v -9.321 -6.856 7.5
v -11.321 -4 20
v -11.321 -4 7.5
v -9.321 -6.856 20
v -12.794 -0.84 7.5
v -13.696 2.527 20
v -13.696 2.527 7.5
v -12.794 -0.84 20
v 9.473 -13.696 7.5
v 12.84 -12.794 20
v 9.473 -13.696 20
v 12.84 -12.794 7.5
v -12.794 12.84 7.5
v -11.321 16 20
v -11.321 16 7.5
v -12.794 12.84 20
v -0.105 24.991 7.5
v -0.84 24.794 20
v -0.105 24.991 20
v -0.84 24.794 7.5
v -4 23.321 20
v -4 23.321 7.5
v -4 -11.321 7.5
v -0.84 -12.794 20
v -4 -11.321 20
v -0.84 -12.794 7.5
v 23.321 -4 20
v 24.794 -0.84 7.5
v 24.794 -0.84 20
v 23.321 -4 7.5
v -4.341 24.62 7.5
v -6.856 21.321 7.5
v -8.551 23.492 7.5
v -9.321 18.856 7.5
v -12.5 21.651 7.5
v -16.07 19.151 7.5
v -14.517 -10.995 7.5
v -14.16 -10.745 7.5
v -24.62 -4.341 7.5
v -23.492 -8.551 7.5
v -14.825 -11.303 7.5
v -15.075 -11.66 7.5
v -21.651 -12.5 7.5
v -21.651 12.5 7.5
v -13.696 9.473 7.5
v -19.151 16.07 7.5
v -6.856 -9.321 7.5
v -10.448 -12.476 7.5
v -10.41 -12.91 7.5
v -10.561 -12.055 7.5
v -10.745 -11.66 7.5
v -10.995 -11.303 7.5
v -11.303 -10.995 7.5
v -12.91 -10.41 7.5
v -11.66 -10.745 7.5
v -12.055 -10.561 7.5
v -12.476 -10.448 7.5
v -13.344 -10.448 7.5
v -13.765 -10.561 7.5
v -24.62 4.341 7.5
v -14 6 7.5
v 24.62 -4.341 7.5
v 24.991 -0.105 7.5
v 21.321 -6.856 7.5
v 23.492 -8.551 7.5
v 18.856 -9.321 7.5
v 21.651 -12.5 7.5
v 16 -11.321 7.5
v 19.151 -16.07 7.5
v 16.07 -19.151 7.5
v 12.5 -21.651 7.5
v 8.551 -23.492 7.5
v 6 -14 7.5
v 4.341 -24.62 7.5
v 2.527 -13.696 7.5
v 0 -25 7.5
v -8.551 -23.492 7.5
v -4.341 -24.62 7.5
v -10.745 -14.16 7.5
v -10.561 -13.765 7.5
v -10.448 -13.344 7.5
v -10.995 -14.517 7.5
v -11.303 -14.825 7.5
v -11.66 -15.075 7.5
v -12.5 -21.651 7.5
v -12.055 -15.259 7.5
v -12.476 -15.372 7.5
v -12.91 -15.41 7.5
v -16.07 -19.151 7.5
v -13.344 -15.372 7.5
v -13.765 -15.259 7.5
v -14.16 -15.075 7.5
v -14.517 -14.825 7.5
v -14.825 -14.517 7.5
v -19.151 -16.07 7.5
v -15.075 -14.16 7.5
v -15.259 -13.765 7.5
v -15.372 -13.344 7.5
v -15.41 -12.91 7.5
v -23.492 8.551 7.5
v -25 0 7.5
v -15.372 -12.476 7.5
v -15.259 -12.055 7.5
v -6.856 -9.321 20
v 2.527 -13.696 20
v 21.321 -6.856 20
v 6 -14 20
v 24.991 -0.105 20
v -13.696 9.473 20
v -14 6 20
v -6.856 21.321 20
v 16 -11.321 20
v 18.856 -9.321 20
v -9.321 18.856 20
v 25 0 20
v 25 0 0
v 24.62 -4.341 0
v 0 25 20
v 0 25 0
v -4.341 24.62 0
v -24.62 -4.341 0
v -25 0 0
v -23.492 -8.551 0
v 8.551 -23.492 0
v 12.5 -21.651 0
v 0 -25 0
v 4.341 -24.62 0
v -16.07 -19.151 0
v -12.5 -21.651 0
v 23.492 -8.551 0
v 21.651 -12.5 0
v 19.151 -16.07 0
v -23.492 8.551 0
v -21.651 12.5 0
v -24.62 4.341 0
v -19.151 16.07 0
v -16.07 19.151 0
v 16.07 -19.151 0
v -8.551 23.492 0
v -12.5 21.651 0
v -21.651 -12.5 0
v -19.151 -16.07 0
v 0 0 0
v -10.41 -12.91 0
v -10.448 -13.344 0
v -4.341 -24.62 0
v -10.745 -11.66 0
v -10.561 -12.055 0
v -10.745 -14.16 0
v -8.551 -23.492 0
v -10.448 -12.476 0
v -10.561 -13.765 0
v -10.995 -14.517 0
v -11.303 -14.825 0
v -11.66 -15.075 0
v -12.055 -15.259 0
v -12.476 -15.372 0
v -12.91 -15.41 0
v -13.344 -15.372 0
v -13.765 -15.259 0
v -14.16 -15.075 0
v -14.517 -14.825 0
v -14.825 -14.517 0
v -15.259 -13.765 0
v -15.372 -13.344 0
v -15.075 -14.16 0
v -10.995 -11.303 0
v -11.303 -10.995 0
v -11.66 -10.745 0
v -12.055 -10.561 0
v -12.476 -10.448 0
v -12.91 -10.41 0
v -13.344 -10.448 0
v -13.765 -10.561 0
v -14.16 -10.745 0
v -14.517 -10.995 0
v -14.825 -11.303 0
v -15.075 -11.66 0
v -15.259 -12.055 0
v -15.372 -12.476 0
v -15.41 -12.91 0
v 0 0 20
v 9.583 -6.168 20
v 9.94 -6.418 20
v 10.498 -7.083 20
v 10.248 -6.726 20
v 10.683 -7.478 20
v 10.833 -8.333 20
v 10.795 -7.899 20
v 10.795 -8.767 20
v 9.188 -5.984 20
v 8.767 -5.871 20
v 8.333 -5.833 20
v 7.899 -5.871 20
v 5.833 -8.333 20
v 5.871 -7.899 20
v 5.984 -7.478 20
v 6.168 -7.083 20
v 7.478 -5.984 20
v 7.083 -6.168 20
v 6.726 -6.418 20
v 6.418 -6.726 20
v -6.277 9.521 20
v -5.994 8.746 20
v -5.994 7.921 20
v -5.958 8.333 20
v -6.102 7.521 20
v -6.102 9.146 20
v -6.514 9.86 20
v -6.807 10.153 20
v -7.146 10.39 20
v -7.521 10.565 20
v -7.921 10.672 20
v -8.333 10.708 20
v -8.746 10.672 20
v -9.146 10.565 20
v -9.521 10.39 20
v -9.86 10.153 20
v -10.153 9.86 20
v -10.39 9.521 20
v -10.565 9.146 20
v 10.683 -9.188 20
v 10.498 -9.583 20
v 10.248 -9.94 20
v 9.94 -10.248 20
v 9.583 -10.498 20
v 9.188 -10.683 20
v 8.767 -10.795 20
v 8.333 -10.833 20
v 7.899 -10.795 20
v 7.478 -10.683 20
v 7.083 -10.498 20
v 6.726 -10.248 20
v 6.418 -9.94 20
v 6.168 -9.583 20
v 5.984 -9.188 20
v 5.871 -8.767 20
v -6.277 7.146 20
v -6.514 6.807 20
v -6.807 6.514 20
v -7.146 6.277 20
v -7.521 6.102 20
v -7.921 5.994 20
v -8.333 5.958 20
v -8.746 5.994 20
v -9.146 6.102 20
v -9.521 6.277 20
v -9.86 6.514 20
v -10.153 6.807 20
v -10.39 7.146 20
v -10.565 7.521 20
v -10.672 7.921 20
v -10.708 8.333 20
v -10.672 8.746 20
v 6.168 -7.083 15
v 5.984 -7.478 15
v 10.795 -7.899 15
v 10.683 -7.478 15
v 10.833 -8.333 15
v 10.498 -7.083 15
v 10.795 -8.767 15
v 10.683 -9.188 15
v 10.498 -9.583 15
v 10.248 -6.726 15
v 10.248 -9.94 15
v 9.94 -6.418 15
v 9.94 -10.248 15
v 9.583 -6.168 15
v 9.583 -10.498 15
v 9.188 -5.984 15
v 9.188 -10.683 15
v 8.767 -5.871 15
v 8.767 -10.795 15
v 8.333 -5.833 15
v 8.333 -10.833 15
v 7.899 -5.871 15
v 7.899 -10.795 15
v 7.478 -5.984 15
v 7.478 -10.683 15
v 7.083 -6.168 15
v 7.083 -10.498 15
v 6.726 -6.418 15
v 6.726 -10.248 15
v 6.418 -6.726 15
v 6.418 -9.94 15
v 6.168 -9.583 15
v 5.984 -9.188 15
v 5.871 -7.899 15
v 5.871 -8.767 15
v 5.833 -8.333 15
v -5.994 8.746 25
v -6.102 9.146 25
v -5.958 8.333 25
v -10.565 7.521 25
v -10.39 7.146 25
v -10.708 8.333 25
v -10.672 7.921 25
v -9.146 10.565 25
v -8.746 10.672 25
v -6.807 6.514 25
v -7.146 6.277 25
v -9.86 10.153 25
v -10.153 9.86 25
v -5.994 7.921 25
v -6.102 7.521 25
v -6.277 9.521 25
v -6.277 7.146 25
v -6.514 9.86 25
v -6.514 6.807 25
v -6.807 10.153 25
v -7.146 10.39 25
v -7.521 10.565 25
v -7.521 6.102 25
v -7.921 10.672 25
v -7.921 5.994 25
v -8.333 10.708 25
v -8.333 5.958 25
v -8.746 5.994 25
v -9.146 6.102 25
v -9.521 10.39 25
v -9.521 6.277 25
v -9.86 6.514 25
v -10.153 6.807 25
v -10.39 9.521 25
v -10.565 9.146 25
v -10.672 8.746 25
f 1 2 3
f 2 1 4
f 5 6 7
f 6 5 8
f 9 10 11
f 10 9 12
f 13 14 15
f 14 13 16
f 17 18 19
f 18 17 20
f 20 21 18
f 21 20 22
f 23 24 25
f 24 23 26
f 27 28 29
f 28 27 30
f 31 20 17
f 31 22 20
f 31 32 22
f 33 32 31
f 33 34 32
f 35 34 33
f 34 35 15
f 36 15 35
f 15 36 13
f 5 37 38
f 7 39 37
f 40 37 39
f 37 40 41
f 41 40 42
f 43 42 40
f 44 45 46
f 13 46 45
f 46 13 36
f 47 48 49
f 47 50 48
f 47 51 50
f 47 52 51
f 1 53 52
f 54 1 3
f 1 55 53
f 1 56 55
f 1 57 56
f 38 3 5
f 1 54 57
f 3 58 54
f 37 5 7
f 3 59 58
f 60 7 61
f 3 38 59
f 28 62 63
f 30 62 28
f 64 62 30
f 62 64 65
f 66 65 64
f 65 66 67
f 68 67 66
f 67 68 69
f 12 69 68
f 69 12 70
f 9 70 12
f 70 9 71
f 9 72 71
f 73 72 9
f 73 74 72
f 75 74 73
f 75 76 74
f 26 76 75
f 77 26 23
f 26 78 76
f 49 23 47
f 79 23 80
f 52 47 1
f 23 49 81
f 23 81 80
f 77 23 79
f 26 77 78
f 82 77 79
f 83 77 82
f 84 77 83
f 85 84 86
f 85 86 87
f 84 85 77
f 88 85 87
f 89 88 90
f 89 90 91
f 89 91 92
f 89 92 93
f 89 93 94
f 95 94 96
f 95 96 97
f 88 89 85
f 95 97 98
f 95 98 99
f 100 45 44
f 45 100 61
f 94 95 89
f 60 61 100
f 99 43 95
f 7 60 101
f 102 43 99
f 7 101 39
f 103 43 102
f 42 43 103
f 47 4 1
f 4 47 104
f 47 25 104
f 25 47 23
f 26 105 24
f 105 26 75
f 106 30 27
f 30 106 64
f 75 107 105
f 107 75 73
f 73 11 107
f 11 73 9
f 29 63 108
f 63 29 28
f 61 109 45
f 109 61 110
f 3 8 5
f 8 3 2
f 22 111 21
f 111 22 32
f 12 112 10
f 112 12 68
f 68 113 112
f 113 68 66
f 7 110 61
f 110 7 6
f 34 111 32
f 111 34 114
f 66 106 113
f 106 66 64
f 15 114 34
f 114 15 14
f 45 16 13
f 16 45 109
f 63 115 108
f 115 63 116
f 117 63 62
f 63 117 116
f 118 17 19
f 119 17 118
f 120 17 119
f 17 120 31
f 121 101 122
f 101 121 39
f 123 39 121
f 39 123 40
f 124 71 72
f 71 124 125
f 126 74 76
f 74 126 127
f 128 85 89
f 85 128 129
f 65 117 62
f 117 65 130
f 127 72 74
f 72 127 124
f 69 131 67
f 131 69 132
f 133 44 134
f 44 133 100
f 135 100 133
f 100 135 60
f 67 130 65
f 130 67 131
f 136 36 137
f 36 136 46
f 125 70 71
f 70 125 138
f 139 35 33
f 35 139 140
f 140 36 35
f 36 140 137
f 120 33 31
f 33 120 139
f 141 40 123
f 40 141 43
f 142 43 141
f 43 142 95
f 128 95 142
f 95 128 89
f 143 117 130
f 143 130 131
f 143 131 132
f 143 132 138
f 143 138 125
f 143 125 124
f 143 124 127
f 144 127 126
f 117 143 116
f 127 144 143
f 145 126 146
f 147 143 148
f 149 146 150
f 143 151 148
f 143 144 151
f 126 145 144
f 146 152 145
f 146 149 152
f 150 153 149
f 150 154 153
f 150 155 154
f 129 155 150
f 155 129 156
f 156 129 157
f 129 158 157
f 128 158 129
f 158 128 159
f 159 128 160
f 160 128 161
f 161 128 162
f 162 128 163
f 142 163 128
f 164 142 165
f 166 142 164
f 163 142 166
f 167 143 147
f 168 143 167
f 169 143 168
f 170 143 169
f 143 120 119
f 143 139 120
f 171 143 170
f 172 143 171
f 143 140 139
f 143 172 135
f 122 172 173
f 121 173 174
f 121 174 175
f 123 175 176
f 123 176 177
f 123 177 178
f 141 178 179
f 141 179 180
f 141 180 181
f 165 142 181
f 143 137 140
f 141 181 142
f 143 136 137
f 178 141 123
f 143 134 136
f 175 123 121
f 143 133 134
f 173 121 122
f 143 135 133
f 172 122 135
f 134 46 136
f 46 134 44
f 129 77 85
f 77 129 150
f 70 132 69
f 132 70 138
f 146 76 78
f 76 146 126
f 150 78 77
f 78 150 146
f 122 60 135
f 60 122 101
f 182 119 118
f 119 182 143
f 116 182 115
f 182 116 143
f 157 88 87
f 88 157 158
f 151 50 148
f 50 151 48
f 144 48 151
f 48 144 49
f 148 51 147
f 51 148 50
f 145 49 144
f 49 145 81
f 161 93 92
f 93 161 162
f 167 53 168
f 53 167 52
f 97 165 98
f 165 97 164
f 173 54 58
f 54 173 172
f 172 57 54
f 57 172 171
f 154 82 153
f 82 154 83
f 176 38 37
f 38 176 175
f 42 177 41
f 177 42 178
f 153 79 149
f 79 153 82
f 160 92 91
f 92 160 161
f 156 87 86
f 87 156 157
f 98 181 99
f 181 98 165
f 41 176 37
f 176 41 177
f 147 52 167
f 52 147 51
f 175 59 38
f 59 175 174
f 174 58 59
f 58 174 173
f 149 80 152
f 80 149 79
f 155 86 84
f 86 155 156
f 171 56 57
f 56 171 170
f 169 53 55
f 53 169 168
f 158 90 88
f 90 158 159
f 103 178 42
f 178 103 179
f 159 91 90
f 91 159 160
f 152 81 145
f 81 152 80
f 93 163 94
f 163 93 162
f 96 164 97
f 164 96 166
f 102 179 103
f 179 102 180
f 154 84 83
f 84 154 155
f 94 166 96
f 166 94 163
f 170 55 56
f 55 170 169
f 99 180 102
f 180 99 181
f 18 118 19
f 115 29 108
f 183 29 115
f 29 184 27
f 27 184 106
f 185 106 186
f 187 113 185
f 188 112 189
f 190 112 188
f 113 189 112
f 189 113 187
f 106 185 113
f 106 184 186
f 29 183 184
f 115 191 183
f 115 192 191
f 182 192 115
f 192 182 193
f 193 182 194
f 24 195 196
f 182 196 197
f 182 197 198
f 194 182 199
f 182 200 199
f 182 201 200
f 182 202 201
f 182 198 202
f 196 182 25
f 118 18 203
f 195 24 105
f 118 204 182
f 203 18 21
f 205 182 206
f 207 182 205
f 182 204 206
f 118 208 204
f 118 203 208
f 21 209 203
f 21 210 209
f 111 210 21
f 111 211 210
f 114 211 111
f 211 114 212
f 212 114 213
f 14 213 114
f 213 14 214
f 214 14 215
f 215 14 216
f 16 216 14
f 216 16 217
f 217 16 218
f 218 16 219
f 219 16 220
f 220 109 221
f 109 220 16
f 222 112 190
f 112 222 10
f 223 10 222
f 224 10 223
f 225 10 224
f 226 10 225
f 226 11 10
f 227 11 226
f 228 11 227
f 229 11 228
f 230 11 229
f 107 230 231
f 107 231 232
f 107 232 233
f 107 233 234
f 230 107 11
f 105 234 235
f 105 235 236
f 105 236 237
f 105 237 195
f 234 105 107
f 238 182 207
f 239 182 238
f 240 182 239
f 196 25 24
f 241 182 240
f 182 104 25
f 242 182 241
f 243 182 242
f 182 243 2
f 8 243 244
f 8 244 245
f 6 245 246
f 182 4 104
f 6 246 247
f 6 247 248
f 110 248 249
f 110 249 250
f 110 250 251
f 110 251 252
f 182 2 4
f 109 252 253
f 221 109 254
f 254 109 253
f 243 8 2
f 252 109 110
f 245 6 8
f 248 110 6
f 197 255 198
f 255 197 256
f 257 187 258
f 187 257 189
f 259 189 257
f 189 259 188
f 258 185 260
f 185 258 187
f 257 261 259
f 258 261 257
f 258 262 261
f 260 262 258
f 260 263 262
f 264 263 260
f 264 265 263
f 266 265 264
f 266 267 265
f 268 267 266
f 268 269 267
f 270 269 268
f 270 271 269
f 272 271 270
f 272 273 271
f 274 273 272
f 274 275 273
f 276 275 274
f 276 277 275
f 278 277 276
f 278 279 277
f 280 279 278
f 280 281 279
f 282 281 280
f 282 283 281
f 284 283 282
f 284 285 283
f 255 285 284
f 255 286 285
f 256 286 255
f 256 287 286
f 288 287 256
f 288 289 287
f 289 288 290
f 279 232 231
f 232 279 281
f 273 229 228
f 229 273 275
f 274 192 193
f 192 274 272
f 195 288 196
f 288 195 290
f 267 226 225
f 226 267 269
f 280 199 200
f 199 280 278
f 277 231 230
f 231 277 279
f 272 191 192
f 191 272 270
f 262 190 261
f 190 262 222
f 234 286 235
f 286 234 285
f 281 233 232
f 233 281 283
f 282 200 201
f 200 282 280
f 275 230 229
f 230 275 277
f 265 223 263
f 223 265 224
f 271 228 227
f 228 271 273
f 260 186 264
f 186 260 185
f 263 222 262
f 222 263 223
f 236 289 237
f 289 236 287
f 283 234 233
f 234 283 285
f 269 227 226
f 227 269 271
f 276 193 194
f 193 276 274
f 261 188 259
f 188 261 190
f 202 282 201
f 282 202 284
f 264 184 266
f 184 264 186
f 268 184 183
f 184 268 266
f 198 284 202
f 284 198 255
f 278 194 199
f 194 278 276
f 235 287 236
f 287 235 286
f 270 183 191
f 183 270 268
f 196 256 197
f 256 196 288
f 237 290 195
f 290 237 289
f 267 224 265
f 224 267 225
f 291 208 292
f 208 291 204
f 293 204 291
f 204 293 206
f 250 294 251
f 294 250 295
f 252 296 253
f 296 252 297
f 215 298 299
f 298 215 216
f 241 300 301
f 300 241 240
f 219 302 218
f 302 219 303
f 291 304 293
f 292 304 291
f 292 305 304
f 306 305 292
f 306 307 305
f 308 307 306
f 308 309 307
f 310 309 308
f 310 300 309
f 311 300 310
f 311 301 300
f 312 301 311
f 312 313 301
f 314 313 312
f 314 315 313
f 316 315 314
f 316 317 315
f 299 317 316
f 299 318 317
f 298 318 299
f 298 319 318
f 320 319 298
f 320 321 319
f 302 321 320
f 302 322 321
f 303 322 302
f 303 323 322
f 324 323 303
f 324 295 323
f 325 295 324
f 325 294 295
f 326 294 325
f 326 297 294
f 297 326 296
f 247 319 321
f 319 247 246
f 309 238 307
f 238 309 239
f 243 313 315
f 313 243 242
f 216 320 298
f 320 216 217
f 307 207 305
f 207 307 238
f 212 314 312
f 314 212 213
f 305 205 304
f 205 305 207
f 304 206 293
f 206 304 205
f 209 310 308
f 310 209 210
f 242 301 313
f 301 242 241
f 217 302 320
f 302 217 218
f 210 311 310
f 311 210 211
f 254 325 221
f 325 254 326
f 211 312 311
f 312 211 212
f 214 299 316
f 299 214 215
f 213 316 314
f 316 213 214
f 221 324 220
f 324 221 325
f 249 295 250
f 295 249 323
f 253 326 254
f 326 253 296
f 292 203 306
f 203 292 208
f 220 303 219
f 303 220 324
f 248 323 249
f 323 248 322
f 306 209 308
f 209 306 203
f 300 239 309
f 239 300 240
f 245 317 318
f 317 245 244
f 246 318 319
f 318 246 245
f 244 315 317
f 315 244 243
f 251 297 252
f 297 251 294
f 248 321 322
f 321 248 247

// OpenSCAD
//----------------------------------------------------------------------------

epsilon = 0.1;
$fn = 36;

width = 40;
diameter = 50;
belt_width = 25;
roundover_offset = 6;
roundover_radius = 20;
bolt_diameter = 5;

pin_diameter = 5;
pin_length = width / 8;

//----------------------------------------------------------------------------

half_corner_with_pins();

//----------------------------------------------------------------------------

module half_corner_with_pins() {
  difference() {
    half_corner();

    translate([diameter / 6, -diameter / 6, 0])
    translate([0, 0, width / 2 - pin_length])
    cylinder(d = pin_diameter, h = pin_length + epsilon);
  }

  translate([-diameter / 6, diameter / 6, 0])
  translate([0, 0, width / 2])
  cylinder(d = pin_diameter * .95, h = pin_length);
}

//----------------------------------------------------------------------------

module half_corner() {
  difference() {
    corner();

    translate([-diameter / 2 - epsilon, -diameter / 2 - epsilon, width / 2])
    cube([diameter + 2 * epsilon, diameter + 2 * epsilon, width / 2 + epsilon]);
  }
}

//----------------------------------------------------------------------------

module corner() {
  difference() {
    body();
    corner_cutoff();
    bolt_cutoff();
  }
}

//----------------------------------------------------------------------------

module body() {
  base_height = (width - belt_width) / 2;

  cylinder(d = diameter, h = base_height);

  translate([0, 0, width - base_height])
  cylinder(d = diameter, h = base_height);

  translate([0, 0, base_height])
  intersection() {
    translate([roundover_offset, roundover_offset, 0])
    cylinder(r = roundover_radius, h = belt_width);

    cylinder(d = diameter, h = belt_width);
  }
}

module corner_cutoff() {
  translate([0, 0, -epsilon])
  cube([diameter, diameter, width + 2 * epsilon]);
}

module bolt_cutoff() {
  x = sqrt(2) * roundover_offset;
  y = roundover_radius - x;
  q = diameter / 2 - y;
  bolt_offset = (y + q / 2) / sqrt(2);

  translate([-bolt_offset, -bolt_offset, 0])
  translate([0, 0, -epsilon])
  cylinder(d = bolt_diameter, h = width + 2 * epsilon);
}

//----------------------------------------------------------------------------
// vim:ft=openscad
